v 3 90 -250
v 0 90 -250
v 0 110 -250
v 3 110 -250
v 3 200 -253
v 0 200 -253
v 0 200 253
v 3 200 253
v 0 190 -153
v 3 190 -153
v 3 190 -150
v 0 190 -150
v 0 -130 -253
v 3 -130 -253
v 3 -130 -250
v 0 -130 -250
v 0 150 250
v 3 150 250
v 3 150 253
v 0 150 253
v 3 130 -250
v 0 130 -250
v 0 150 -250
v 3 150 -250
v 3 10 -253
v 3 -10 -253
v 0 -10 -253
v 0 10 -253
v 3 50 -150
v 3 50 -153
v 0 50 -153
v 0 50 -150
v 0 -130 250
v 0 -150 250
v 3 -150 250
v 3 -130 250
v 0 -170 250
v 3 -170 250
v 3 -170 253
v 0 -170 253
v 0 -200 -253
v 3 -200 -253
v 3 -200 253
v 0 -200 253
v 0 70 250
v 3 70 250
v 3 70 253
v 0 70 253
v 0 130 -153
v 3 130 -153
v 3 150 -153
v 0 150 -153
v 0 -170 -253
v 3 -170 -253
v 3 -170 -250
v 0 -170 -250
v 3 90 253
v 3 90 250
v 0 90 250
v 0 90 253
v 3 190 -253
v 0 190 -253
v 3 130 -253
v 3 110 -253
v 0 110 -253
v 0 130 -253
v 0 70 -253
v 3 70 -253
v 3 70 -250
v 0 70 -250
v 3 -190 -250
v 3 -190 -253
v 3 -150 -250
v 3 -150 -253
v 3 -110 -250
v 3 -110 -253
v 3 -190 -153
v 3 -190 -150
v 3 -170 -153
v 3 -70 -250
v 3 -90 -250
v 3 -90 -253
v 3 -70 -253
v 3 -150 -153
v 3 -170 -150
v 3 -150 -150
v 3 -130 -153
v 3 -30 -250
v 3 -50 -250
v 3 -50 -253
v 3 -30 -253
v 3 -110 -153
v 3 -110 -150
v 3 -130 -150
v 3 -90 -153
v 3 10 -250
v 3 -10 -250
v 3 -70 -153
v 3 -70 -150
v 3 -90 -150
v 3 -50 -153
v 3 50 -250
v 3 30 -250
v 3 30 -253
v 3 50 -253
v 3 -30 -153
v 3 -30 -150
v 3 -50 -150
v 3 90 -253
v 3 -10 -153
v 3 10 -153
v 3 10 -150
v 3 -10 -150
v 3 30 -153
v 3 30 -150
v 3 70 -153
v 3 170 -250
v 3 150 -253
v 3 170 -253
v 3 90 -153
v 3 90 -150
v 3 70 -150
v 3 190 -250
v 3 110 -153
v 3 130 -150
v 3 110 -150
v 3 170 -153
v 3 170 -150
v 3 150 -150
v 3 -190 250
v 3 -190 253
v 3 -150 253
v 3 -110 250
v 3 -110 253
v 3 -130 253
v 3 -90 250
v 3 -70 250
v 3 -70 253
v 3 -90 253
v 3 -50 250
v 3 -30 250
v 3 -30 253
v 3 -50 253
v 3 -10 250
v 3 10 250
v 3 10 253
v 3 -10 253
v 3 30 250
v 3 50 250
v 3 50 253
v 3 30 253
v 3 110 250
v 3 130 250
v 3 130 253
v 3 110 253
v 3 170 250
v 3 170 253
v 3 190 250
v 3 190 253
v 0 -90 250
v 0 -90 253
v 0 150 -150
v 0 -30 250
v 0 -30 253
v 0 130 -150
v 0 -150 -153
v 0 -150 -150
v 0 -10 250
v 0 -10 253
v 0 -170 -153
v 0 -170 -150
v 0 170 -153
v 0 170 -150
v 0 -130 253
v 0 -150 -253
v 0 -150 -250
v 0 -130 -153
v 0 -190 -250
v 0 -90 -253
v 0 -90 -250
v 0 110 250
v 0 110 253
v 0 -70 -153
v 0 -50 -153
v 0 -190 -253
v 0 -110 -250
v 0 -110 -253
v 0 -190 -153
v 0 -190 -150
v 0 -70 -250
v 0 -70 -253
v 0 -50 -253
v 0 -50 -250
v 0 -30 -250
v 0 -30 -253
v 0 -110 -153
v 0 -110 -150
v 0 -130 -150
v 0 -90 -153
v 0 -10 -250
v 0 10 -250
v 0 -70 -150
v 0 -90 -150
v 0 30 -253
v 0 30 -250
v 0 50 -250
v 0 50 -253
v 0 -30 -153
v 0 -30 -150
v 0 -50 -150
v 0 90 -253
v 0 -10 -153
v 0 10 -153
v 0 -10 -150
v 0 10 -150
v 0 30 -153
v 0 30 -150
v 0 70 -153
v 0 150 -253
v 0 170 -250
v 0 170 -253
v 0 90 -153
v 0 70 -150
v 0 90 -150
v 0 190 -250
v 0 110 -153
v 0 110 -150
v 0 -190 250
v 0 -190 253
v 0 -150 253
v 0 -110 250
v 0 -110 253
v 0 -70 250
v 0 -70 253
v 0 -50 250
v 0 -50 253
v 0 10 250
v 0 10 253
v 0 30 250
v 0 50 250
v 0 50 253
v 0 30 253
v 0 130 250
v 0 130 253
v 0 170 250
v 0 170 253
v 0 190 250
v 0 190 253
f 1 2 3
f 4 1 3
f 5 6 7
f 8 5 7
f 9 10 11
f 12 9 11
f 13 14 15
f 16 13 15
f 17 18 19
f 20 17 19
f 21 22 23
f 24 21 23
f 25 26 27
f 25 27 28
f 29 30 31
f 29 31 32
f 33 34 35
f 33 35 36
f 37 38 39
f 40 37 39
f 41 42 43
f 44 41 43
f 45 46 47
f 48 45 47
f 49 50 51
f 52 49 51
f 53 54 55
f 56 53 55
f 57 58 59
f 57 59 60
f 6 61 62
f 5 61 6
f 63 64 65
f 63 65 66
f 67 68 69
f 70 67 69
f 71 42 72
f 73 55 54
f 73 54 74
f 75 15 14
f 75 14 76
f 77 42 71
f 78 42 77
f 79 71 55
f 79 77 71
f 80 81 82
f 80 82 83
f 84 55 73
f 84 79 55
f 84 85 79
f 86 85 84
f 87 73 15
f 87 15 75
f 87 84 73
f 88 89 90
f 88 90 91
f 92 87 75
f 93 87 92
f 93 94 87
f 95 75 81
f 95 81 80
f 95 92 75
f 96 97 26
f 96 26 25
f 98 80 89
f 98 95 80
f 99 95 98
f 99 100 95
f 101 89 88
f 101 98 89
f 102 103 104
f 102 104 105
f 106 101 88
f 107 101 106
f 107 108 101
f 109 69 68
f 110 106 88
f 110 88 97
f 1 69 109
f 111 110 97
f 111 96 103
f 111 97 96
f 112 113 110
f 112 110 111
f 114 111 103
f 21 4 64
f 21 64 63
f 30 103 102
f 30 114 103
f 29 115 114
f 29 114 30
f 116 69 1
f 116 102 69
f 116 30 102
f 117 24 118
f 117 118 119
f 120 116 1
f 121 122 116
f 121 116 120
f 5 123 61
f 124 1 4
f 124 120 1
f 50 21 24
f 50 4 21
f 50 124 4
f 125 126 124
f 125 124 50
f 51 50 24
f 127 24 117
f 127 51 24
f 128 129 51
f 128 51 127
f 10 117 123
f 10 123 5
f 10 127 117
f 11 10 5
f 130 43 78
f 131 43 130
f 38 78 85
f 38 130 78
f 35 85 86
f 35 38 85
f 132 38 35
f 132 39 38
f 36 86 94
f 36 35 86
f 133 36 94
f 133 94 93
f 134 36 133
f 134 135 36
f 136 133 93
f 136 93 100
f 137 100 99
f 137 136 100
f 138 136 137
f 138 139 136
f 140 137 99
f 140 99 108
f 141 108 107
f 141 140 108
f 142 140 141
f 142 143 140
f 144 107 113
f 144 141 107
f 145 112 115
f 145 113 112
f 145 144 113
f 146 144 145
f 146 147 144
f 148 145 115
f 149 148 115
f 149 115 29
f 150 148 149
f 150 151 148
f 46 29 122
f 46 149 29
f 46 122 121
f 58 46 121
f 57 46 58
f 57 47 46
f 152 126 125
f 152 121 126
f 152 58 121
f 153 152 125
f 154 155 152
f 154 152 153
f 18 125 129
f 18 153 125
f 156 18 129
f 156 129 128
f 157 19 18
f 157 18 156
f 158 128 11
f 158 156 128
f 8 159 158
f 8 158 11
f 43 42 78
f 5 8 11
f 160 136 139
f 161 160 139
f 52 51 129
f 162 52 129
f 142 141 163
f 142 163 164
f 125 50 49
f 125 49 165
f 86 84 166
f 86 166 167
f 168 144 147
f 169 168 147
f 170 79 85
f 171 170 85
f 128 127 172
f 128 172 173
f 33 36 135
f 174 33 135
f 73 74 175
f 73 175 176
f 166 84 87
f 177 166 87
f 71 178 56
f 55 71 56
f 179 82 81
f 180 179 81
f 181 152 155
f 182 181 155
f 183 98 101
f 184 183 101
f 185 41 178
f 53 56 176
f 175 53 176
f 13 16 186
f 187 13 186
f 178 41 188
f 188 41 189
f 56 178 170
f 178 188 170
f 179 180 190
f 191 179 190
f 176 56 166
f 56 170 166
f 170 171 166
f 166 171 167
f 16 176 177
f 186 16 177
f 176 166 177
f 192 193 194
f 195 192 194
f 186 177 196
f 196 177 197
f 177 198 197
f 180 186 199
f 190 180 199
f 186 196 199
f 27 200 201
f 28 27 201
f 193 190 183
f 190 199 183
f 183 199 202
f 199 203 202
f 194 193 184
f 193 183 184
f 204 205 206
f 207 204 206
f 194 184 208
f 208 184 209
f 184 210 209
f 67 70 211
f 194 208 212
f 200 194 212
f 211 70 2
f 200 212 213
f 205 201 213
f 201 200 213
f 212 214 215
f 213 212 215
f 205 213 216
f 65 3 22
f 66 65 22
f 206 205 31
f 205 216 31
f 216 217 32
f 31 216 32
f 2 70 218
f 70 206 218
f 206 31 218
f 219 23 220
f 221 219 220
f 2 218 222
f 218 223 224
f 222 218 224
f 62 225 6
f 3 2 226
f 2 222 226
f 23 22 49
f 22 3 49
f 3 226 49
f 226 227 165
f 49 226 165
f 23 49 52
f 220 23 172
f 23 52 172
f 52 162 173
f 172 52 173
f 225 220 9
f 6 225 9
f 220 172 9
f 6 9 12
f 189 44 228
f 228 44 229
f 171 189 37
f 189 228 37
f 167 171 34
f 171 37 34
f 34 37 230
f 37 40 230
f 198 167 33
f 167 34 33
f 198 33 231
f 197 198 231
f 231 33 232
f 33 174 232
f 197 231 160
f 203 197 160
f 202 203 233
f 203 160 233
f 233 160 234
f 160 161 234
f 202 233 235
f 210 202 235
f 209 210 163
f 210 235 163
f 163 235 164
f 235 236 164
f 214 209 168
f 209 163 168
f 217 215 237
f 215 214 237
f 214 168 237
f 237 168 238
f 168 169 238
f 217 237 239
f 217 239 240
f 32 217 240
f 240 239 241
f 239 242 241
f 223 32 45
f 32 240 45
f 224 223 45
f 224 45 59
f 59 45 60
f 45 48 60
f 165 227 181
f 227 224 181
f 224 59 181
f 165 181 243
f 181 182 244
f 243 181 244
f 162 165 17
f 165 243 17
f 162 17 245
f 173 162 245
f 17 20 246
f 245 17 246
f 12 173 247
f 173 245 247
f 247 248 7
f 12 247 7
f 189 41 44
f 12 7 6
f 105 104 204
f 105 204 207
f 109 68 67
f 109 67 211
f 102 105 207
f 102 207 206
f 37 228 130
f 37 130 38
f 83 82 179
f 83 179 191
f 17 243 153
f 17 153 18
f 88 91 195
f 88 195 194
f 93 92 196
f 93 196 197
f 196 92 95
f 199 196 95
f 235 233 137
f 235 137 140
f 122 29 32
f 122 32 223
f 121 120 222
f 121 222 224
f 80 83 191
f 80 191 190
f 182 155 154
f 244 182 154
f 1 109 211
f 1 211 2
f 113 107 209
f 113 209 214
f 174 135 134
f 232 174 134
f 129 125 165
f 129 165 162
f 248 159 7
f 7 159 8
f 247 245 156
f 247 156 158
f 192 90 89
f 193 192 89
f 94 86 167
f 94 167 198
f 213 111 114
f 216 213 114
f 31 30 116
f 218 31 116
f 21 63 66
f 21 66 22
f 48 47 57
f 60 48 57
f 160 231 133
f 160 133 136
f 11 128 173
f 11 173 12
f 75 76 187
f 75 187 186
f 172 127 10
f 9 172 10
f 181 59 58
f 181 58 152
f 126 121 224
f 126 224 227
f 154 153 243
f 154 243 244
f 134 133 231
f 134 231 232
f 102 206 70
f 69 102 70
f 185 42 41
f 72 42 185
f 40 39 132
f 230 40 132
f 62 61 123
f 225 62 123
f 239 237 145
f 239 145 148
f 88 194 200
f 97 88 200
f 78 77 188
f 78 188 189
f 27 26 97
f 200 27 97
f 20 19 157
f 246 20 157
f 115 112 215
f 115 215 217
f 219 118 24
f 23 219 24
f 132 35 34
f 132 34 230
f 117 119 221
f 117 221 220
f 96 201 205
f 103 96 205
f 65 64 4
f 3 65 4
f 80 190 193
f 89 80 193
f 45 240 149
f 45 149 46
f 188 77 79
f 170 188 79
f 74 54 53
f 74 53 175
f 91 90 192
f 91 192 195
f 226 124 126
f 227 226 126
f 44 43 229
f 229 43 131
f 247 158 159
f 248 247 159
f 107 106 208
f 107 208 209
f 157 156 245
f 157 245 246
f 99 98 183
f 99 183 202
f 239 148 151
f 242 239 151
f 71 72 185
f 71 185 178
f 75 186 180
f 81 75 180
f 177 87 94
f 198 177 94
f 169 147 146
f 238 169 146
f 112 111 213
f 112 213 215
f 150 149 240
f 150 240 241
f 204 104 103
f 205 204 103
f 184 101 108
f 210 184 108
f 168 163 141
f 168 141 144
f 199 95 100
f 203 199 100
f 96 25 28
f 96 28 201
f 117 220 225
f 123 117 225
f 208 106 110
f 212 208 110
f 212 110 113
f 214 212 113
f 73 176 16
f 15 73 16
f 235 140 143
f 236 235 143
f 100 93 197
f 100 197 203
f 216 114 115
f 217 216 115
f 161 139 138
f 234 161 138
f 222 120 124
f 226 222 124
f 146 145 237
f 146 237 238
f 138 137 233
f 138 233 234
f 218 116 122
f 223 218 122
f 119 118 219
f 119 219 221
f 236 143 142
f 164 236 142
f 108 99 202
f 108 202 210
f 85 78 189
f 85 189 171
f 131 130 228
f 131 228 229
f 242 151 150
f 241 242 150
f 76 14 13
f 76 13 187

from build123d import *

# Parameters (mm, degrees)
F0_W     = 400
F0_H     = 500
F1_DEPTH = 3
F2_W     = 10
F2_H     = 3
F2_W_2   = 20
F3_DEPTH = 3
F4_W     = 20
F4_H     = 3
F5_DEPTH = 25


with BuildPart() as f1:
    # F0 (on Right) → F1 (new body)
    with BuildSketch(Plane.YZ):
        Rectangle(F0_W, F0_H)
    extrude(amount=F1_DEPTH)

    # F2 (on face) → F3 (join, through all)
    with BuildSketch(Plane.YZ.offset(3)):
        with Locations((-195, 251.5)):
            Rectangle(F2_W, F2_H)
        with Locations((-160, 251.5)):
            Rectangle(F2_W_2, F2_H)
        with Locations((-120, 251.5)):
            Rectangle(F2_W_2, F2_H)
        with Locations((-80, 251.5)):
            Rectangle(F2_W_2, F2_H)
        with Locations((-40, 251.5)):
            Rectangle(F2_W_2, F2_H)
        with Locations((0, 251.5)):
            Rectangle(F2_W_2, F2_H)
        with Locations((40, 251.5)):
            Rectangle(F2_W_2, F2_H)
        with Locations((80, 251.5)):
            Rectangle(F2_W_2, F2_H)
        with Locations((120, 251.5)):
            Rectangle(F2_W_2, F2_H)
        with Locations((160, 251.5)):
            Rectangle(F2_W_2, F2_H)
        with Locations((195, 251.5)):
            Rectangle(F2_W, F2_H)
        with Locations((-120, -251.5)):
            Rectangle(F2_W_2, F2_H)
        with Locations((-160, -251.5)):
            Rectangle(F2_W_2, F2_H)
        with Locations((-80, -251.5)):
            Rectangle(F2_W_2, F2_H)
        with Locations((0, -251.5)):
            Rectangle(F2_W_2, F2_H)
        with Locations((160, -251.5)):
            Rectangle(F2_W_2, F2_H)
        with Locations((80, -251.5)):
            Rectangle(F2_W_2, F2_H)
        with Locations((195, -251.5)):
            Rectangle(F2_W, F2_H)
        with Locations((40, -251.5)):
            Rectangle(F2_W_2, F2_H)
        with Locations((-195, -251.5)):
            Rectangle(F2_W, F2_H)
        with Locations((-40, -251.5)):
            Rectangle(F2_W_2, F2_H)
        with Locations((120, -251.5)):
            Rectangle(F2_W_2, F2_H)
    extrude(amount=-F3_DEPTH)

    # F4 (on face) → F5 (cut)
    with BuildSketch(Plane.YZ.offset(3)):
        with Locations((-180, -151.5)):
            Rectangle(F4_W, F4_H)
        with Locations((-140, -151.5)):
            Rectangle(F4_W, F4_H)
        with Locations((-100, -151.5)):
            Rectangle(F4_W, F4_H)
        with Locations((-60, -151.5)):
            Rectangle(F4_W, F4_H)
        with Locations((-20, -151.5)):
            Rectangle(F4_W, F4_H)
        with Locations((20, -151.5)):
            Rectangle(F4_W, F4_H)
        with Locations((60, -151.5)):
            Rectangle(F4_W, F4_H)
        with Locations((100, -151.5)):
            Rectangle(F4_W, F4_H)
        with Locations((140, -151.5)):
            Rectangle(F4_W, F4_H)
        with Locations((180, -151.5)):
            Rectangle(F4_W, F4_H)
    extrude(amount=-F5_DEPTH, mode=Mode.SUBTRACT)


solid = f1.part
